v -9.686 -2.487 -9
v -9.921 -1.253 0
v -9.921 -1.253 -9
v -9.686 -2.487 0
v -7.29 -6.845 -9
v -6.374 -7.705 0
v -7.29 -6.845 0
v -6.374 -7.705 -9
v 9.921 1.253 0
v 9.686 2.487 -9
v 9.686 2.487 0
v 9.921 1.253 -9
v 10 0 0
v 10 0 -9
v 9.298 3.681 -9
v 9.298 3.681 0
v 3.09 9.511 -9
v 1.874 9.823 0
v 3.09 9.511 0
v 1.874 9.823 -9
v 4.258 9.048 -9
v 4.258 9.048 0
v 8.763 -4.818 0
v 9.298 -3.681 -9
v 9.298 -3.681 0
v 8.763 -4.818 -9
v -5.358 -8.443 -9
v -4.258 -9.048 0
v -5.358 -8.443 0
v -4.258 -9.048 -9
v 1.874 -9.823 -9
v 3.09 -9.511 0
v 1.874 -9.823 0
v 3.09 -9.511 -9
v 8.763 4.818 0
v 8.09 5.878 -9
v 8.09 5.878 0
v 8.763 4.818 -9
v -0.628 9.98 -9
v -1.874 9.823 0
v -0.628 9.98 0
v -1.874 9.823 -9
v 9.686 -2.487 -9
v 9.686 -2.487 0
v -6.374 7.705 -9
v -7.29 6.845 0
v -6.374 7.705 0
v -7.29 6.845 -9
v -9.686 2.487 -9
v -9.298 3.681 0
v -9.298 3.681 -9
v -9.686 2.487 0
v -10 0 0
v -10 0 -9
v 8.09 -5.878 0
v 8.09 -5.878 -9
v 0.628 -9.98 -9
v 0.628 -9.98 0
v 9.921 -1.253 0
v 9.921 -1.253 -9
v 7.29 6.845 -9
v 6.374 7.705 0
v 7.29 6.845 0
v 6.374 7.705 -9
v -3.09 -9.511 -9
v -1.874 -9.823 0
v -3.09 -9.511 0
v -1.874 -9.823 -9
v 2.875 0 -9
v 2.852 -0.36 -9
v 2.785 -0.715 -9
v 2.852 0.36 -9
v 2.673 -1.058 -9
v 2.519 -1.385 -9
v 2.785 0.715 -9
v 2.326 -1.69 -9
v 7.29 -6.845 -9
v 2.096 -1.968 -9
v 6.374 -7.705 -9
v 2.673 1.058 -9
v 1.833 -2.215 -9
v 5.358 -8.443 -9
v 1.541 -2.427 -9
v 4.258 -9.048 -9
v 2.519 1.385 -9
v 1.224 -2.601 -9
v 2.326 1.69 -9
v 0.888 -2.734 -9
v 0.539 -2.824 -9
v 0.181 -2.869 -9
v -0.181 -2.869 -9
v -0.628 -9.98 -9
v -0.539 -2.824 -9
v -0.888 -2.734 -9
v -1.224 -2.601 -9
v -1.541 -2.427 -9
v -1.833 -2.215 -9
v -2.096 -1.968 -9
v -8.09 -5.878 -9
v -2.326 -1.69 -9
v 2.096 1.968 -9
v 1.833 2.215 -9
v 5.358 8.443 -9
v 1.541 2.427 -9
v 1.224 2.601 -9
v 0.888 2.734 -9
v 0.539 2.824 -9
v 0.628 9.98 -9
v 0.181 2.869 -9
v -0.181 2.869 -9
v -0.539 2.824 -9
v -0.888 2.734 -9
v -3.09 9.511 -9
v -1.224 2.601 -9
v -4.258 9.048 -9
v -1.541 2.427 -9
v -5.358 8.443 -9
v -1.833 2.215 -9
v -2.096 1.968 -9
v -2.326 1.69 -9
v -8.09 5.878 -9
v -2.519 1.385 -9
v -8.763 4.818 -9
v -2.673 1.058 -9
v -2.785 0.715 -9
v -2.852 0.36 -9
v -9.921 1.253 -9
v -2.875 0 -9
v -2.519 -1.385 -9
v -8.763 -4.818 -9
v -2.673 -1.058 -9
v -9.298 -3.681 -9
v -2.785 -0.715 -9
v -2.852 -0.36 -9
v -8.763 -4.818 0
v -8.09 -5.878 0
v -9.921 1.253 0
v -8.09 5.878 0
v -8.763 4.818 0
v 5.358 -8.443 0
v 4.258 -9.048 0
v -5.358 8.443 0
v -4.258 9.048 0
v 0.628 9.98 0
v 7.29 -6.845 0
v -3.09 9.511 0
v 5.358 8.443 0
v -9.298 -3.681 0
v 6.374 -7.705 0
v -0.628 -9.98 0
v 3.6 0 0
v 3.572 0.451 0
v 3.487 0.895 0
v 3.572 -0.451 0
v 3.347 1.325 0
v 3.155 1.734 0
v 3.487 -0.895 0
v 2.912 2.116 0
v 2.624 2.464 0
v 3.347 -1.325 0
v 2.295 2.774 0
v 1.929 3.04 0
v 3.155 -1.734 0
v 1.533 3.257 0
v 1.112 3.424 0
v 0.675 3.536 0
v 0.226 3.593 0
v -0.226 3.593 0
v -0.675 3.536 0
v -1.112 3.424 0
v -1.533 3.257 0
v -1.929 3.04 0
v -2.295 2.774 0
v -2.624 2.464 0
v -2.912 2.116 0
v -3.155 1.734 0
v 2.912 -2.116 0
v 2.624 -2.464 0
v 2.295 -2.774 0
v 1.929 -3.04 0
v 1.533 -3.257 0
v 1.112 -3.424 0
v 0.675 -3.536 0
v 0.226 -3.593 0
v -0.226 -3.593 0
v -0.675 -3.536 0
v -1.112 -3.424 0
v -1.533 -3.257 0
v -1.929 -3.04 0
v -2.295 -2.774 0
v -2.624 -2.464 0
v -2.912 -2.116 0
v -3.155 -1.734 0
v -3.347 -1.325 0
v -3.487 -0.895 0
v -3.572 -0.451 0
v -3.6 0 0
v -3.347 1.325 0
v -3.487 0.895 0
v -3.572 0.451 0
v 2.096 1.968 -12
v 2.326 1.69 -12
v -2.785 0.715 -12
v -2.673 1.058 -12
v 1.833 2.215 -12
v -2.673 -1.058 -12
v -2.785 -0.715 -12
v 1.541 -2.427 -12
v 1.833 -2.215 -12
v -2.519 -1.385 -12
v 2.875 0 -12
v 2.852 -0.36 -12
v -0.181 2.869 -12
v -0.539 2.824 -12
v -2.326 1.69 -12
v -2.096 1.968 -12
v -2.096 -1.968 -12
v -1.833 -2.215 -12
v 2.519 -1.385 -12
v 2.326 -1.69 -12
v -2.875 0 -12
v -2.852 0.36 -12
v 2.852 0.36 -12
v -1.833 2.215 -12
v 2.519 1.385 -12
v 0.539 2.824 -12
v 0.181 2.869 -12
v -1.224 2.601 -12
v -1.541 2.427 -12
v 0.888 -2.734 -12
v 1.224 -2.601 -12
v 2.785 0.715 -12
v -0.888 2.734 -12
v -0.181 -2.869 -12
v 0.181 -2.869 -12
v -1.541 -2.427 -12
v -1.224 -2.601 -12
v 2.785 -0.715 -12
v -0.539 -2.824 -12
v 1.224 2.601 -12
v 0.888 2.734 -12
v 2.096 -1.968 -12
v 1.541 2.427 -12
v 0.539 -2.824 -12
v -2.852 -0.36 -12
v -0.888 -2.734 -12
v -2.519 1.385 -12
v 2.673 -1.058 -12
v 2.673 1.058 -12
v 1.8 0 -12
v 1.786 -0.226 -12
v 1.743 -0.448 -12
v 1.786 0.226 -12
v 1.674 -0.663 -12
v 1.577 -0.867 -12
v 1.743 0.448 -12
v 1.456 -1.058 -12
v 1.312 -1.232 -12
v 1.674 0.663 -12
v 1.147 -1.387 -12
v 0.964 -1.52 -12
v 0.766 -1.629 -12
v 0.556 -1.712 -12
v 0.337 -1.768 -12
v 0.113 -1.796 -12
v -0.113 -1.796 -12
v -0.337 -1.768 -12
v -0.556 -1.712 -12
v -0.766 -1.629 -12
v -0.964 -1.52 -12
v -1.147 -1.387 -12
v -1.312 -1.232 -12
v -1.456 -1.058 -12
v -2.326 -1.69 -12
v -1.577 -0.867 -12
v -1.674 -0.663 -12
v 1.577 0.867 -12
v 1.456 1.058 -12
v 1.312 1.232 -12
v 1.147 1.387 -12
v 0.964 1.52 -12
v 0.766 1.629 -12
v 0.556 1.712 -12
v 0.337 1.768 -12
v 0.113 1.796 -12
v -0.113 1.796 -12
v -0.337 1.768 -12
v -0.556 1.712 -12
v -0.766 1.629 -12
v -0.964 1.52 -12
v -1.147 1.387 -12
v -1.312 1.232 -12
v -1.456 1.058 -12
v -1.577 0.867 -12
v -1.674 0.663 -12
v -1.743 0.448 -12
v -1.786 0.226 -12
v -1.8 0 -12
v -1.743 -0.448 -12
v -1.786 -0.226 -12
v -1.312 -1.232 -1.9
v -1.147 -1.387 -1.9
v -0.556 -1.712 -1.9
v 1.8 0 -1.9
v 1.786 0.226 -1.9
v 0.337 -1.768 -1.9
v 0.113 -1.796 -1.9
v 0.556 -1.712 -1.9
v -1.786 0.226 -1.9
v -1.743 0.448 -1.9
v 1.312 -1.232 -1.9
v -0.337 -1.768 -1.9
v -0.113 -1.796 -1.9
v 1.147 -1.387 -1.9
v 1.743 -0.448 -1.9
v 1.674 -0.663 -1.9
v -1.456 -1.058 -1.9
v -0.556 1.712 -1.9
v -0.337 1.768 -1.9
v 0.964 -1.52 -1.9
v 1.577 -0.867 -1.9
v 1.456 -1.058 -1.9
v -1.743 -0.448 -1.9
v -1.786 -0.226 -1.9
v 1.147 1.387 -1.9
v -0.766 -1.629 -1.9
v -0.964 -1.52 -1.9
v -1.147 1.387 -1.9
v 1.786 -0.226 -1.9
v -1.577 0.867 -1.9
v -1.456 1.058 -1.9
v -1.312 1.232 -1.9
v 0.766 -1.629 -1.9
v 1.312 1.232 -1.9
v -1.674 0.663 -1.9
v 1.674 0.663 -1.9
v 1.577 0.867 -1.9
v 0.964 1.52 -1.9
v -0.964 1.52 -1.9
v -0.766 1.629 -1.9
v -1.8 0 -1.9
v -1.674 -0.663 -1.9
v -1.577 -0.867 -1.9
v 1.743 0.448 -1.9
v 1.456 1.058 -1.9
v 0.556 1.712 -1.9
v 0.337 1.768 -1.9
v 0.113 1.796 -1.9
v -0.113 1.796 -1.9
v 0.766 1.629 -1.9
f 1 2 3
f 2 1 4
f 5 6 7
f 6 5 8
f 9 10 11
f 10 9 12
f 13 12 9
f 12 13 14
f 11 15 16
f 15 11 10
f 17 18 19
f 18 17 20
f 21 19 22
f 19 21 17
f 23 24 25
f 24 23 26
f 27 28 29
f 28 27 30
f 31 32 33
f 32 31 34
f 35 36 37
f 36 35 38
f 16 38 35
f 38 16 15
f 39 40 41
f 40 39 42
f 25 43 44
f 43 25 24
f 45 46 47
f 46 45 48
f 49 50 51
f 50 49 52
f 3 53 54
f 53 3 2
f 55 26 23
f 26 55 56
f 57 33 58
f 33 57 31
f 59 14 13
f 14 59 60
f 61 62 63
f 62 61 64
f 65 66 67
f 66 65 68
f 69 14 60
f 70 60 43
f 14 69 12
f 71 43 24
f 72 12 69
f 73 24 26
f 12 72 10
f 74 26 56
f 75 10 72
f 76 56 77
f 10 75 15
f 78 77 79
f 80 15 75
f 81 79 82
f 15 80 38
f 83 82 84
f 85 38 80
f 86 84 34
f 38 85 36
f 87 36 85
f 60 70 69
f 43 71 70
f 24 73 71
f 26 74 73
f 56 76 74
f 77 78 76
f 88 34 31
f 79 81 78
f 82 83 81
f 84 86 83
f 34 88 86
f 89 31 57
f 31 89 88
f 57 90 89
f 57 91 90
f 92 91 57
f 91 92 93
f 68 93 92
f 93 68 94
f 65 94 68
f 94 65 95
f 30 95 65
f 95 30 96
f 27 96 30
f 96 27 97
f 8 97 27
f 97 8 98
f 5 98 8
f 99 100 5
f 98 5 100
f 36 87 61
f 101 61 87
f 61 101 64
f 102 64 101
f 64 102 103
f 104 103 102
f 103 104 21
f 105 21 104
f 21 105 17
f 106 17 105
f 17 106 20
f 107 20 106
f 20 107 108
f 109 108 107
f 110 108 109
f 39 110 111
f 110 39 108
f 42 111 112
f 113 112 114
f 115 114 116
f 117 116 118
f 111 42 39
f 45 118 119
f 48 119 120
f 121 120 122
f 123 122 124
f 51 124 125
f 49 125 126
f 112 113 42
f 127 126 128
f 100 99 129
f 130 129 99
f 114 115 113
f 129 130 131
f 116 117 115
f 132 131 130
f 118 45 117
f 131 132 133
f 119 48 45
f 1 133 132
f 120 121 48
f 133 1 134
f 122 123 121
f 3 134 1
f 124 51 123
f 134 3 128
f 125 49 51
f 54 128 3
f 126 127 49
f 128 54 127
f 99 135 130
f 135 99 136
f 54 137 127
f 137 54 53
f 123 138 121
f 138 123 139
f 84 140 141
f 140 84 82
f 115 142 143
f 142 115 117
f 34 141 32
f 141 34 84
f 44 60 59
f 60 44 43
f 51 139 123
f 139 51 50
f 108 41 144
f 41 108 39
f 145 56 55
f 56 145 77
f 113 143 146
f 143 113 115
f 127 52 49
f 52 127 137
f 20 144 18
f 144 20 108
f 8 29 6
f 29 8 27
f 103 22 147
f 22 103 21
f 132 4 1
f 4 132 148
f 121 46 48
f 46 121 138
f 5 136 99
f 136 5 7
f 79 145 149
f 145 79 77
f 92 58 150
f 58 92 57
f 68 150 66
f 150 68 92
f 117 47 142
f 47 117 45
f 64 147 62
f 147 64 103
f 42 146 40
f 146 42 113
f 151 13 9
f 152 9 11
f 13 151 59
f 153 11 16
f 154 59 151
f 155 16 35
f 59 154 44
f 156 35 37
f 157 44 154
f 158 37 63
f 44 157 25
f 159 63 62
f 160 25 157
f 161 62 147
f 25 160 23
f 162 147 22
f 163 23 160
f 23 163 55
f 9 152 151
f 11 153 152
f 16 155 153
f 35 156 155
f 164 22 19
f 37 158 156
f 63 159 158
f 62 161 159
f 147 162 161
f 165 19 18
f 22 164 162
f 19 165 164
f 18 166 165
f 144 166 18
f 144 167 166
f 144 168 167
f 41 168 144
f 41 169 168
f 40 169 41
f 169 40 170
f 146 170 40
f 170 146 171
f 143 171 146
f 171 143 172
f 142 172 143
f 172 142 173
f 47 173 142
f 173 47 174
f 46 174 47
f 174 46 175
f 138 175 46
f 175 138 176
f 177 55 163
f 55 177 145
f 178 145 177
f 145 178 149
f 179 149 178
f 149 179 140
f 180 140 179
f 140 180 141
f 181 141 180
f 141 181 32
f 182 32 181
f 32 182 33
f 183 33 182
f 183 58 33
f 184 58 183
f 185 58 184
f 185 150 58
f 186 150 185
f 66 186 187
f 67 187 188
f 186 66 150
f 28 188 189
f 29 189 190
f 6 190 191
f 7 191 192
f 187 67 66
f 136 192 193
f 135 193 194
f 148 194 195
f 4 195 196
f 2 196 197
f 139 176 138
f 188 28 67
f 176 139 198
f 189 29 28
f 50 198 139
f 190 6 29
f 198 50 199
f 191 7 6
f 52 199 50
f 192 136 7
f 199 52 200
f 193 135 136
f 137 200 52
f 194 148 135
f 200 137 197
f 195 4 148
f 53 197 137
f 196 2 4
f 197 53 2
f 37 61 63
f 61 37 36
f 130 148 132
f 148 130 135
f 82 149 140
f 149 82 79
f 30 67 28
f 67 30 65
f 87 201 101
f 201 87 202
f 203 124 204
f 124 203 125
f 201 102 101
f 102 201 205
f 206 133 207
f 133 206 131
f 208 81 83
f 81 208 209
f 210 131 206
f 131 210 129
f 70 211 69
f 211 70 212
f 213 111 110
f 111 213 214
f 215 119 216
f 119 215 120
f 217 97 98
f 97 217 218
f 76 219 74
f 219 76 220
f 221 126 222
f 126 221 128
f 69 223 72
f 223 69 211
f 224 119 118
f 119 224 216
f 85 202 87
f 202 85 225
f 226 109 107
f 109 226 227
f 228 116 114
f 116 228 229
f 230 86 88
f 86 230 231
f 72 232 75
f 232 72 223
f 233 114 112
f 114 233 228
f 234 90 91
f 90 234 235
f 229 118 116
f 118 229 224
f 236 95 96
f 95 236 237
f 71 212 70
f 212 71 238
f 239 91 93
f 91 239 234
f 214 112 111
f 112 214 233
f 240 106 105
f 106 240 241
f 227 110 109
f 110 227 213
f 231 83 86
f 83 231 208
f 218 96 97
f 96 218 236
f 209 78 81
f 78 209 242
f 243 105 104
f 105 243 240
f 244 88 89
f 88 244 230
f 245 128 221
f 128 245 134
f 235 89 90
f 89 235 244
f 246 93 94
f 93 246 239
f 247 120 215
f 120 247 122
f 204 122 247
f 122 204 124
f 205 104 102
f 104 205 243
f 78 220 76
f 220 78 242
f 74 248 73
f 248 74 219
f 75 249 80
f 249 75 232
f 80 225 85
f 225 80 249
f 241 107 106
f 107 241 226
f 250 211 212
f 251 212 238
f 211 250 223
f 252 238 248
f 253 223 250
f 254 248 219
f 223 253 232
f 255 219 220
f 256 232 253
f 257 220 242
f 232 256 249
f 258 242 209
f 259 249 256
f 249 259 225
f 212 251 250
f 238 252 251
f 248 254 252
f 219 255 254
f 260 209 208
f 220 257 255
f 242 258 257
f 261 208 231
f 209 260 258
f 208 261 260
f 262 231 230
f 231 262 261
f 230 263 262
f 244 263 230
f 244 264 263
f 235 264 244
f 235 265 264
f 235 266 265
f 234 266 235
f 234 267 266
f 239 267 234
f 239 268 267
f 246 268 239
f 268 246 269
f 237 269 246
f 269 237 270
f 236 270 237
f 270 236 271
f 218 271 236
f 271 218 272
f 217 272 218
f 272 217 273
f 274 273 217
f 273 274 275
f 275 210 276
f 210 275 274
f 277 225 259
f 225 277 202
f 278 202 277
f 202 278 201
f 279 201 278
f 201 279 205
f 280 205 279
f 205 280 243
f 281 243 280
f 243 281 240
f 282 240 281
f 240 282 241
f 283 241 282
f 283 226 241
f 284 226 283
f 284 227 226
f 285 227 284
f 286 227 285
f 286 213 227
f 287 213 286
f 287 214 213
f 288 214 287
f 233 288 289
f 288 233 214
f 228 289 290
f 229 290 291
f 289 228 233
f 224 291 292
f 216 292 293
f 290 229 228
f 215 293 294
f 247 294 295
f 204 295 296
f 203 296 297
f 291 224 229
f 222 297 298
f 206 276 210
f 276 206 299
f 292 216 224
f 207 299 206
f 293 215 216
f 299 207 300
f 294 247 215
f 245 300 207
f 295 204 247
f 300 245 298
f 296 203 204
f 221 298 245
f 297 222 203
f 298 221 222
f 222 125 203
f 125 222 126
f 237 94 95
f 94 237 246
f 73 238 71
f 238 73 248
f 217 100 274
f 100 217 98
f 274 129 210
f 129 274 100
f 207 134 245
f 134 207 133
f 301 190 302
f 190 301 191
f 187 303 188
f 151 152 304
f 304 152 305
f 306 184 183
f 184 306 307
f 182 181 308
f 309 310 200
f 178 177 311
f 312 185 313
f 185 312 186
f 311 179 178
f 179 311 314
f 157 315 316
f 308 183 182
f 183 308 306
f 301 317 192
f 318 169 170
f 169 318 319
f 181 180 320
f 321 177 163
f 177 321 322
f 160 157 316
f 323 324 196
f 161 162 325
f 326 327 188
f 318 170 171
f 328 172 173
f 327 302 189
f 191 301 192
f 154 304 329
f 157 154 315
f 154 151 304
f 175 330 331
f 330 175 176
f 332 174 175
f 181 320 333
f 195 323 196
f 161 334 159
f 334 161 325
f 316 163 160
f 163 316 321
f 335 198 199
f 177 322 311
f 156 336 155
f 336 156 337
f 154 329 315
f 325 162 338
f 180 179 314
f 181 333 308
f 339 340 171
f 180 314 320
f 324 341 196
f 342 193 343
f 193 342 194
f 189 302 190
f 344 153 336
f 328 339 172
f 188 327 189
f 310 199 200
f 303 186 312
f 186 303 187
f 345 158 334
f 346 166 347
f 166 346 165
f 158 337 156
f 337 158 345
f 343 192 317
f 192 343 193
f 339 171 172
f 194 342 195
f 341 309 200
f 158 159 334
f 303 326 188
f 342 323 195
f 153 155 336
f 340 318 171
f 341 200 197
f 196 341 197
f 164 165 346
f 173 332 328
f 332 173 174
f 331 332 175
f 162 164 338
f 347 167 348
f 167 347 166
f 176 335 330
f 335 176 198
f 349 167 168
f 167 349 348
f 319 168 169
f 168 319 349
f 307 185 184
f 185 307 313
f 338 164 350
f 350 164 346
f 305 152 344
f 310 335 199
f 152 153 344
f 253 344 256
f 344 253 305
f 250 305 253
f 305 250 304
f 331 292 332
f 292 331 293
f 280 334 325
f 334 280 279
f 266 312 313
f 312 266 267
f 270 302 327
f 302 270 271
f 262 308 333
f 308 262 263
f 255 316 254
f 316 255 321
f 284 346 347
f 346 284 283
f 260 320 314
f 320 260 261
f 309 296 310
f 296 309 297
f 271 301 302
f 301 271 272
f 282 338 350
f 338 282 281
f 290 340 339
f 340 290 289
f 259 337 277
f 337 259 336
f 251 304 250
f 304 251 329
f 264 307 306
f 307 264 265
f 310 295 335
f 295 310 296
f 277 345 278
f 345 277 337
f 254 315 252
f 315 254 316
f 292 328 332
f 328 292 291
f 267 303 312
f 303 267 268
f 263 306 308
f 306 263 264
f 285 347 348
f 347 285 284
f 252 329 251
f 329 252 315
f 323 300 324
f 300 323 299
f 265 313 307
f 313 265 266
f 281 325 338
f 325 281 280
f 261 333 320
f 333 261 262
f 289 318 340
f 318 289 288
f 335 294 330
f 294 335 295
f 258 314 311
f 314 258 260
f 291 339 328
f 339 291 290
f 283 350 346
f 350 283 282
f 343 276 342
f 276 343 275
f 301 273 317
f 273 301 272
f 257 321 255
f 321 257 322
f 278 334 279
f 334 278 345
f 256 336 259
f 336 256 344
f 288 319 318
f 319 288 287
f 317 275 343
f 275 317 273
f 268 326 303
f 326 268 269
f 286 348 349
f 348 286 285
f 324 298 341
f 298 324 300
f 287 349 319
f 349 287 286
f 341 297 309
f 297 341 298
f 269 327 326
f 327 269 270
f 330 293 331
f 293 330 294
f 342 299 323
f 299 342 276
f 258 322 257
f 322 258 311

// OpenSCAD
$fn = 50;


difference() {
	union() {
		translate(v = [0, 0, -9.0000000000]) {
			cylinder(h = 9, r = 10.0000000000);
		}
		#translate(v = [0, 0, -12.0000000000]) {
			cylinder(h = 12, r = 2.8750000000);
		}
	}
	union() {
		translate(v = [0, 0, 0]) {
			rotate(a = [0, 0, 0]) {
				difference() {
					union() {
						translate(v = [0, 0, -12.0000000000]) {
							cylinder(h = 12, r = 1.5000000000);
						}
						translate(v = [0, 0, -1.9000000000]) {
							cylinder(h = 1.9000000000, r1 = 1.8000000000, r2 = 3.6000000000);
						}
						translate(v = [0, 0, -12.0000000000]) {
							cylinder(h = 12, r = 1.8000000000);
						}
						translate(v = [0, 0, -12.0000000000]) {
							cylinder(h = 12, r = 1.5000000000);
						}
					}
					union();
				}
			}
		}
	}
}
